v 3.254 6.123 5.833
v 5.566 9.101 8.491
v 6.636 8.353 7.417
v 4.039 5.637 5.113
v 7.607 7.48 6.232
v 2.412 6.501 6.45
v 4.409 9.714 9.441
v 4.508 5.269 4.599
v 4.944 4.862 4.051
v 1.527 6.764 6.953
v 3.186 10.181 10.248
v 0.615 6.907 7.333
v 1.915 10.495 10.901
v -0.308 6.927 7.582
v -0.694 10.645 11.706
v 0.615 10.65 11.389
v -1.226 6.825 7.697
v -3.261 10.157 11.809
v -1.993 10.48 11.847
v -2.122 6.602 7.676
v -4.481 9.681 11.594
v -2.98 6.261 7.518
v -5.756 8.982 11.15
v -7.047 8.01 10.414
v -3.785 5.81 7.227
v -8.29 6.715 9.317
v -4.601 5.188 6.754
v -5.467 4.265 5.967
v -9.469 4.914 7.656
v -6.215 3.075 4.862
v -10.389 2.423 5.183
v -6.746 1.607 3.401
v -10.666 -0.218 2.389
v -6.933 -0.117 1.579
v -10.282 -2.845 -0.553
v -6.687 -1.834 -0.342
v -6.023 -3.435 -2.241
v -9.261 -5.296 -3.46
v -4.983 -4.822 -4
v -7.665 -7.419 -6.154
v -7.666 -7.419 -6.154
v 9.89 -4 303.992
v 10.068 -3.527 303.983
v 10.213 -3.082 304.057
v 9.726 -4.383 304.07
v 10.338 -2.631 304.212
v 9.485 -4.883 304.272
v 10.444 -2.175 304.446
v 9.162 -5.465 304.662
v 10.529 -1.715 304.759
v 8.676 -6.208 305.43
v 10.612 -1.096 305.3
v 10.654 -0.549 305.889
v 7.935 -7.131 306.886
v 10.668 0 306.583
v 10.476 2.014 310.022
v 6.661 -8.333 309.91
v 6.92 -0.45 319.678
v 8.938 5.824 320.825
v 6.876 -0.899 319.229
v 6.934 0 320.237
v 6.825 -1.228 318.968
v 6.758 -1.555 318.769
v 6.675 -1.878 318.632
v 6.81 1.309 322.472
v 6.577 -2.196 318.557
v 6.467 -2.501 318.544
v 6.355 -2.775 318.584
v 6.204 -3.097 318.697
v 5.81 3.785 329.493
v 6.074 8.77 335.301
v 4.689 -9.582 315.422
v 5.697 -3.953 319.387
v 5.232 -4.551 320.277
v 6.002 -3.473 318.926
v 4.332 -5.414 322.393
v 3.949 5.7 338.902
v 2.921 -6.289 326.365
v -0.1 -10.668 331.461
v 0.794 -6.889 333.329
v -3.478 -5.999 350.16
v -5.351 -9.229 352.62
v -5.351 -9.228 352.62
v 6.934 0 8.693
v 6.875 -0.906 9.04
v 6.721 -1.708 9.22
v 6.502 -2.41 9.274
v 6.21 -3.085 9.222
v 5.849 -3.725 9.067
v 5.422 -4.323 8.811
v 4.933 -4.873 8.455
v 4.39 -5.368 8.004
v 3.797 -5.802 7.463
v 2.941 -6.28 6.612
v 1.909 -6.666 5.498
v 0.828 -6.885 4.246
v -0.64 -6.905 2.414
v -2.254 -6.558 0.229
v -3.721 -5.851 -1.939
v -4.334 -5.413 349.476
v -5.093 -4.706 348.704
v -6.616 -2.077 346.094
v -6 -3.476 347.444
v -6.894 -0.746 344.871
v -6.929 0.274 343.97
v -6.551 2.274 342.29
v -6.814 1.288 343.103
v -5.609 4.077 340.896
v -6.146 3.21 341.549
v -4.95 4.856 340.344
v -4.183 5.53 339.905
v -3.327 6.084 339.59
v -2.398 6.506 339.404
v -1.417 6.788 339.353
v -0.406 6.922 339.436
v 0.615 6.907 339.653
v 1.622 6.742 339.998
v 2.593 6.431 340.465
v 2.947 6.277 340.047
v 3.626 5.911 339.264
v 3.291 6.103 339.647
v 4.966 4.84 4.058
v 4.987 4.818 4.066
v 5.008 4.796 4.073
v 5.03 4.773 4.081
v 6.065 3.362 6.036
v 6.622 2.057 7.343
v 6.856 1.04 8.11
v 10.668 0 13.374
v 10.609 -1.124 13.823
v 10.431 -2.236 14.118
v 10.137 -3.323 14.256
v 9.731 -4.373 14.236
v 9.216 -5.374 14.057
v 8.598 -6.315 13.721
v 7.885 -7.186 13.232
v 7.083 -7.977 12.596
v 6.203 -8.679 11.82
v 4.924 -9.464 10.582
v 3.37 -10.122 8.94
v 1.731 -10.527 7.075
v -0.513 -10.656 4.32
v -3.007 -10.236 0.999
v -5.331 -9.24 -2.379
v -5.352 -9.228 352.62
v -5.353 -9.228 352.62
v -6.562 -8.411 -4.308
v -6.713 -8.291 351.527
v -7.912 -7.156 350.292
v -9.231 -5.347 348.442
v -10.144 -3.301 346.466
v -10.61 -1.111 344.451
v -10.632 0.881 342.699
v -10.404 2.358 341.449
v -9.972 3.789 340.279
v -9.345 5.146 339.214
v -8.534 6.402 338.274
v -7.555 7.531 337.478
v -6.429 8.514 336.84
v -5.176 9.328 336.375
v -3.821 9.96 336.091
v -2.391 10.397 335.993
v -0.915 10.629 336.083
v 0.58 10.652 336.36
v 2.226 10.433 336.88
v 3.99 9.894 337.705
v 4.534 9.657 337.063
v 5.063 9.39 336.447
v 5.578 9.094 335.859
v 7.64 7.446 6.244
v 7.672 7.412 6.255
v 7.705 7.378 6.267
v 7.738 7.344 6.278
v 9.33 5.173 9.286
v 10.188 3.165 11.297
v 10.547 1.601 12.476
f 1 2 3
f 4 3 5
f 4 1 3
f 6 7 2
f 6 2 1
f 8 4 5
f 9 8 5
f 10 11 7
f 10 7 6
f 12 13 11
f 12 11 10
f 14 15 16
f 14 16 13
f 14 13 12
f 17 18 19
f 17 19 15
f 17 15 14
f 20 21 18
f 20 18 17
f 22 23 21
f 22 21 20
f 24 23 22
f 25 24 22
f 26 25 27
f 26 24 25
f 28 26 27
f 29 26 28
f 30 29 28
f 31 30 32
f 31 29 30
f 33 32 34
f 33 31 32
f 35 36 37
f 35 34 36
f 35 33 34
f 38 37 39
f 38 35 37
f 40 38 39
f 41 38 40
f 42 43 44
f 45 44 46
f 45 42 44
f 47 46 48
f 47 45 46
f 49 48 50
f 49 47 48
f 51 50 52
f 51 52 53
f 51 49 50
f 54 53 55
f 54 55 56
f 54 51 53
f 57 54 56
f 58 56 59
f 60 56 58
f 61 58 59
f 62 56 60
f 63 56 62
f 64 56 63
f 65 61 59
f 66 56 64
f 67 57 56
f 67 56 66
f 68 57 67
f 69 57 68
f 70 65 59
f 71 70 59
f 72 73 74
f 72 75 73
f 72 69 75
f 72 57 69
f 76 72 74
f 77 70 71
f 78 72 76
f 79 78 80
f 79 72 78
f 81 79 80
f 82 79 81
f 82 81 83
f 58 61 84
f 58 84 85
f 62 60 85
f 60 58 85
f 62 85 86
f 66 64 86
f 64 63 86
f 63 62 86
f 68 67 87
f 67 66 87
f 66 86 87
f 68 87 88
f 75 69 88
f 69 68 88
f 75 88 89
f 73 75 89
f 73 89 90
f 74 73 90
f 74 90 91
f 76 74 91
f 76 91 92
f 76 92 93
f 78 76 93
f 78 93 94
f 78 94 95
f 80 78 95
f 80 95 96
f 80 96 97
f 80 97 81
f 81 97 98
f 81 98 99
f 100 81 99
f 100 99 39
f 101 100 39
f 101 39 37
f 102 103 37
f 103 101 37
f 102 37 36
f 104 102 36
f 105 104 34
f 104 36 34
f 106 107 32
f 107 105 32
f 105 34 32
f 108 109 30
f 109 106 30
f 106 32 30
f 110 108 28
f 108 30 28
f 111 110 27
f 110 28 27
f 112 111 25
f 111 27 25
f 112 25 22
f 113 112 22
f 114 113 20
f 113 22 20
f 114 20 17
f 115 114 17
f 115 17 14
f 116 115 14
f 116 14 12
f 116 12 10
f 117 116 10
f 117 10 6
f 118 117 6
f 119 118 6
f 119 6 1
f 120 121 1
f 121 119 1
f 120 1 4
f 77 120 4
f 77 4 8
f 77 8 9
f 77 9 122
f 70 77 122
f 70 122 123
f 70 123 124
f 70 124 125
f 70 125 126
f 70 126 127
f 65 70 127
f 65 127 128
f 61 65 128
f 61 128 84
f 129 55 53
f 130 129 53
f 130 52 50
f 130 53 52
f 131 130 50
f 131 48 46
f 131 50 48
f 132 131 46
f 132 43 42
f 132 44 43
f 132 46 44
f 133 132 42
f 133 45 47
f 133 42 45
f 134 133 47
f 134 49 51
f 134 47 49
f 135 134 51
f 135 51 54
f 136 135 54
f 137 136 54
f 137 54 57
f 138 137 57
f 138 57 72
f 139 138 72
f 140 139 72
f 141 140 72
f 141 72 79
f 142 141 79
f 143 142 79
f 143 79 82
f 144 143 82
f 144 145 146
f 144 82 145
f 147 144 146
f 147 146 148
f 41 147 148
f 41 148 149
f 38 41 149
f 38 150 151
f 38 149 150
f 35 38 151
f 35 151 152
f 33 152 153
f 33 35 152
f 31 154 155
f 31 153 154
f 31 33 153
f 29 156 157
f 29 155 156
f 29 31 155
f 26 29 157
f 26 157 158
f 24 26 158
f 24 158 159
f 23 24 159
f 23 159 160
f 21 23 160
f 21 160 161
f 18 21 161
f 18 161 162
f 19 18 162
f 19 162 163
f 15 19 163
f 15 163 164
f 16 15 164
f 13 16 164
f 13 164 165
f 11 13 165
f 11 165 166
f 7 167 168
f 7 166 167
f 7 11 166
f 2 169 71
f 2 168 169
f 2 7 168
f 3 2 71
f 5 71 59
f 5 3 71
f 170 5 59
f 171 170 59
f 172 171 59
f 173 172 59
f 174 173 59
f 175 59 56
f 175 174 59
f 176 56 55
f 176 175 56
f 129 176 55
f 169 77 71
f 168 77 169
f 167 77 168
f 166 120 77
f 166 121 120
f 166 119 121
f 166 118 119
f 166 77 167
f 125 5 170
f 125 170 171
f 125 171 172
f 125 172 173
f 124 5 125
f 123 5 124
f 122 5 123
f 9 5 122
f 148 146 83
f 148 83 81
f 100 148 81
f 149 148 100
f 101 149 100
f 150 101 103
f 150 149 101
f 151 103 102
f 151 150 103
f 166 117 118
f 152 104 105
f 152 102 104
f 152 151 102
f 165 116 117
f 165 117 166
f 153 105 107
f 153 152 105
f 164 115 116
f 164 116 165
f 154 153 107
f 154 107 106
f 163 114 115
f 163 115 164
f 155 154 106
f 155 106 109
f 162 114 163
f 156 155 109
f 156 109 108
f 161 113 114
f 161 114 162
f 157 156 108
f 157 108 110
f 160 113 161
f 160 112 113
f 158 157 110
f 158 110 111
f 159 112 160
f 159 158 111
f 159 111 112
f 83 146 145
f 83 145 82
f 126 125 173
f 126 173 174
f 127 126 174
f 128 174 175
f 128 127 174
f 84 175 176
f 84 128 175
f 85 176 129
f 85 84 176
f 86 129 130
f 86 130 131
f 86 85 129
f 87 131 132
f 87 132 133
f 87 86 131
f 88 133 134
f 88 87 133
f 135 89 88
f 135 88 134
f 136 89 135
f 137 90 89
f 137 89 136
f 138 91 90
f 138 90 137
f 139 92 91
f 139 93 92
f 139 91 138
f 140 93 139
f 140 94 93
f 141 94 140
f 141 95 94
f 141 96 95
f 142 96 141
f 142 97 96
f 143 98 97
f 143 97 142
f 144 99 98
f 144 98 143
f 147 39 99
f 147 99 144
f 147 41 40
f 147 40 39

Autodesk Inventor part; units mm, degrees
ref_plane "Start Plane" through (0, 0, -6.1539) normal (0, 0, 1) x (1, 0, 0)
ref_plane "End Plane" through (0, 0, 352.6196) normal (0, 0, 1) x (1, 0, 0)
sketch "Sketch" plane through (0, 0, 0) normal (0, 0, 1) x (1, 0, 0)
  circle A0 centre (0, 0) radius 6.9342
  circle A1 centre (0, 0) radius 10.668
  dimension "d0" = 21.336
  dimension "d1" = 3.7338
extrude "Body" add sketch "Sketch" along normal up to surface (358.7736 mm away) from surface at -6.1539
sketch "Sketch3" plane through (0, 0, 0) normal (0, 0, 1) x (1, 0, 0)
  line L0 (0, 0) -> (10, 0)
ref_plane "Work Plane3" through (0, 0, 0) normal (0, -1, 0) x (1, 0, 0)
sketch "Sketch4" plane through (0, 0, 0) normal (0, -1, 0) x (1, 0, 0)
  line L0 (-2, -6.1539) -> (12, -6.1539)
  line L1 (-2, 352.6196) -> (12, 352.6196)
  dimension "d7" = 358.7736
ref_plane "Work Plane4" through (2.3628, -10.403, 355.1877) normal (-0.1481, 0.6522, 0.7434) x (0.9874, 0.0554, 0.1481)
split "Split1" plane through (2.3628, -10.403, 355.1877) removes the side toward (-0.1481, 0.6522, 0.7434)
ref_plane "Work Plane5" through (-10.4409, -2.1896, 359.7619) normal (0.7819, 0.164, 0.6014) x (0.6182, -0.0801, -0.7819)
split "Split2" plane through (-10.4409, -2.1896, 359.7619) removes the side toward (0.7819, 0.164, 0.6014)
ref_plane "Work Plane6" through (-9.9997, 3.7164, 387.2134) normal (0.908, -0.3375, 0.2483) x (0.3395, 0.2455, -0.908)
split "Split3" plane through (-9.9997, 3.7164, 387.2134) removes the side toward (0.908, -0.3375, 0.2483)
ref_plane "Work Plane7" through (2.3628, -10.403, -11.8569) normal (-0.1647, 0.7249, -0.6689) x (0.9181, 0.3604, 0.1647)
split "Split4" plane through (2.3628, -10.403, -11.8569) removes the side toward (-0.1647, 0.7249, -0.6689)
ref_plane "Work Plane8" through (-9.9997, 3.7164, -14.2686) normal (0.7507, -0.279, -0.5988) x (-0.4048, 0.5221, -0.7507)
split "Split5" plane through (-9.9997, 3.7164, -14.2686) removes the side toward (0.7507, -0.279, -0.5988)
ref_plane "Work Plane9" through (-9.9328, -3.8919, -6.776) normal (0.4992, 0.1956, -0.8441) x (-0.5987, -0.6264, -0.4992)
split "Split6" plane through (-9.9328, -3.8919, -6.776) removes the side toward (0.4992, 0.1956, -0.8441)
equation "\"d0\" = G_H"
equation "\"d1\" = G_T"
equation "\"d2\" = G_L"
equation "\"G_H\" = 21.336"
equation "\"G_T\" = 3.7338"
equation "\"G_L\" = 358.77357"
equation "\"G_OFFSET_START\" = 6.15394"
equation "\"G_OFFSET_END\" = 7.03027"
equation "\"d4\" = -G_OFFSET_START"
equation "\"d5\" = G_OFFSET_END + B_L"
equation "\"B_L\" = 345.58937"
properties part number "ANSI - 1/2 x 0.147 - 14.125" material "Steel, Mild"
